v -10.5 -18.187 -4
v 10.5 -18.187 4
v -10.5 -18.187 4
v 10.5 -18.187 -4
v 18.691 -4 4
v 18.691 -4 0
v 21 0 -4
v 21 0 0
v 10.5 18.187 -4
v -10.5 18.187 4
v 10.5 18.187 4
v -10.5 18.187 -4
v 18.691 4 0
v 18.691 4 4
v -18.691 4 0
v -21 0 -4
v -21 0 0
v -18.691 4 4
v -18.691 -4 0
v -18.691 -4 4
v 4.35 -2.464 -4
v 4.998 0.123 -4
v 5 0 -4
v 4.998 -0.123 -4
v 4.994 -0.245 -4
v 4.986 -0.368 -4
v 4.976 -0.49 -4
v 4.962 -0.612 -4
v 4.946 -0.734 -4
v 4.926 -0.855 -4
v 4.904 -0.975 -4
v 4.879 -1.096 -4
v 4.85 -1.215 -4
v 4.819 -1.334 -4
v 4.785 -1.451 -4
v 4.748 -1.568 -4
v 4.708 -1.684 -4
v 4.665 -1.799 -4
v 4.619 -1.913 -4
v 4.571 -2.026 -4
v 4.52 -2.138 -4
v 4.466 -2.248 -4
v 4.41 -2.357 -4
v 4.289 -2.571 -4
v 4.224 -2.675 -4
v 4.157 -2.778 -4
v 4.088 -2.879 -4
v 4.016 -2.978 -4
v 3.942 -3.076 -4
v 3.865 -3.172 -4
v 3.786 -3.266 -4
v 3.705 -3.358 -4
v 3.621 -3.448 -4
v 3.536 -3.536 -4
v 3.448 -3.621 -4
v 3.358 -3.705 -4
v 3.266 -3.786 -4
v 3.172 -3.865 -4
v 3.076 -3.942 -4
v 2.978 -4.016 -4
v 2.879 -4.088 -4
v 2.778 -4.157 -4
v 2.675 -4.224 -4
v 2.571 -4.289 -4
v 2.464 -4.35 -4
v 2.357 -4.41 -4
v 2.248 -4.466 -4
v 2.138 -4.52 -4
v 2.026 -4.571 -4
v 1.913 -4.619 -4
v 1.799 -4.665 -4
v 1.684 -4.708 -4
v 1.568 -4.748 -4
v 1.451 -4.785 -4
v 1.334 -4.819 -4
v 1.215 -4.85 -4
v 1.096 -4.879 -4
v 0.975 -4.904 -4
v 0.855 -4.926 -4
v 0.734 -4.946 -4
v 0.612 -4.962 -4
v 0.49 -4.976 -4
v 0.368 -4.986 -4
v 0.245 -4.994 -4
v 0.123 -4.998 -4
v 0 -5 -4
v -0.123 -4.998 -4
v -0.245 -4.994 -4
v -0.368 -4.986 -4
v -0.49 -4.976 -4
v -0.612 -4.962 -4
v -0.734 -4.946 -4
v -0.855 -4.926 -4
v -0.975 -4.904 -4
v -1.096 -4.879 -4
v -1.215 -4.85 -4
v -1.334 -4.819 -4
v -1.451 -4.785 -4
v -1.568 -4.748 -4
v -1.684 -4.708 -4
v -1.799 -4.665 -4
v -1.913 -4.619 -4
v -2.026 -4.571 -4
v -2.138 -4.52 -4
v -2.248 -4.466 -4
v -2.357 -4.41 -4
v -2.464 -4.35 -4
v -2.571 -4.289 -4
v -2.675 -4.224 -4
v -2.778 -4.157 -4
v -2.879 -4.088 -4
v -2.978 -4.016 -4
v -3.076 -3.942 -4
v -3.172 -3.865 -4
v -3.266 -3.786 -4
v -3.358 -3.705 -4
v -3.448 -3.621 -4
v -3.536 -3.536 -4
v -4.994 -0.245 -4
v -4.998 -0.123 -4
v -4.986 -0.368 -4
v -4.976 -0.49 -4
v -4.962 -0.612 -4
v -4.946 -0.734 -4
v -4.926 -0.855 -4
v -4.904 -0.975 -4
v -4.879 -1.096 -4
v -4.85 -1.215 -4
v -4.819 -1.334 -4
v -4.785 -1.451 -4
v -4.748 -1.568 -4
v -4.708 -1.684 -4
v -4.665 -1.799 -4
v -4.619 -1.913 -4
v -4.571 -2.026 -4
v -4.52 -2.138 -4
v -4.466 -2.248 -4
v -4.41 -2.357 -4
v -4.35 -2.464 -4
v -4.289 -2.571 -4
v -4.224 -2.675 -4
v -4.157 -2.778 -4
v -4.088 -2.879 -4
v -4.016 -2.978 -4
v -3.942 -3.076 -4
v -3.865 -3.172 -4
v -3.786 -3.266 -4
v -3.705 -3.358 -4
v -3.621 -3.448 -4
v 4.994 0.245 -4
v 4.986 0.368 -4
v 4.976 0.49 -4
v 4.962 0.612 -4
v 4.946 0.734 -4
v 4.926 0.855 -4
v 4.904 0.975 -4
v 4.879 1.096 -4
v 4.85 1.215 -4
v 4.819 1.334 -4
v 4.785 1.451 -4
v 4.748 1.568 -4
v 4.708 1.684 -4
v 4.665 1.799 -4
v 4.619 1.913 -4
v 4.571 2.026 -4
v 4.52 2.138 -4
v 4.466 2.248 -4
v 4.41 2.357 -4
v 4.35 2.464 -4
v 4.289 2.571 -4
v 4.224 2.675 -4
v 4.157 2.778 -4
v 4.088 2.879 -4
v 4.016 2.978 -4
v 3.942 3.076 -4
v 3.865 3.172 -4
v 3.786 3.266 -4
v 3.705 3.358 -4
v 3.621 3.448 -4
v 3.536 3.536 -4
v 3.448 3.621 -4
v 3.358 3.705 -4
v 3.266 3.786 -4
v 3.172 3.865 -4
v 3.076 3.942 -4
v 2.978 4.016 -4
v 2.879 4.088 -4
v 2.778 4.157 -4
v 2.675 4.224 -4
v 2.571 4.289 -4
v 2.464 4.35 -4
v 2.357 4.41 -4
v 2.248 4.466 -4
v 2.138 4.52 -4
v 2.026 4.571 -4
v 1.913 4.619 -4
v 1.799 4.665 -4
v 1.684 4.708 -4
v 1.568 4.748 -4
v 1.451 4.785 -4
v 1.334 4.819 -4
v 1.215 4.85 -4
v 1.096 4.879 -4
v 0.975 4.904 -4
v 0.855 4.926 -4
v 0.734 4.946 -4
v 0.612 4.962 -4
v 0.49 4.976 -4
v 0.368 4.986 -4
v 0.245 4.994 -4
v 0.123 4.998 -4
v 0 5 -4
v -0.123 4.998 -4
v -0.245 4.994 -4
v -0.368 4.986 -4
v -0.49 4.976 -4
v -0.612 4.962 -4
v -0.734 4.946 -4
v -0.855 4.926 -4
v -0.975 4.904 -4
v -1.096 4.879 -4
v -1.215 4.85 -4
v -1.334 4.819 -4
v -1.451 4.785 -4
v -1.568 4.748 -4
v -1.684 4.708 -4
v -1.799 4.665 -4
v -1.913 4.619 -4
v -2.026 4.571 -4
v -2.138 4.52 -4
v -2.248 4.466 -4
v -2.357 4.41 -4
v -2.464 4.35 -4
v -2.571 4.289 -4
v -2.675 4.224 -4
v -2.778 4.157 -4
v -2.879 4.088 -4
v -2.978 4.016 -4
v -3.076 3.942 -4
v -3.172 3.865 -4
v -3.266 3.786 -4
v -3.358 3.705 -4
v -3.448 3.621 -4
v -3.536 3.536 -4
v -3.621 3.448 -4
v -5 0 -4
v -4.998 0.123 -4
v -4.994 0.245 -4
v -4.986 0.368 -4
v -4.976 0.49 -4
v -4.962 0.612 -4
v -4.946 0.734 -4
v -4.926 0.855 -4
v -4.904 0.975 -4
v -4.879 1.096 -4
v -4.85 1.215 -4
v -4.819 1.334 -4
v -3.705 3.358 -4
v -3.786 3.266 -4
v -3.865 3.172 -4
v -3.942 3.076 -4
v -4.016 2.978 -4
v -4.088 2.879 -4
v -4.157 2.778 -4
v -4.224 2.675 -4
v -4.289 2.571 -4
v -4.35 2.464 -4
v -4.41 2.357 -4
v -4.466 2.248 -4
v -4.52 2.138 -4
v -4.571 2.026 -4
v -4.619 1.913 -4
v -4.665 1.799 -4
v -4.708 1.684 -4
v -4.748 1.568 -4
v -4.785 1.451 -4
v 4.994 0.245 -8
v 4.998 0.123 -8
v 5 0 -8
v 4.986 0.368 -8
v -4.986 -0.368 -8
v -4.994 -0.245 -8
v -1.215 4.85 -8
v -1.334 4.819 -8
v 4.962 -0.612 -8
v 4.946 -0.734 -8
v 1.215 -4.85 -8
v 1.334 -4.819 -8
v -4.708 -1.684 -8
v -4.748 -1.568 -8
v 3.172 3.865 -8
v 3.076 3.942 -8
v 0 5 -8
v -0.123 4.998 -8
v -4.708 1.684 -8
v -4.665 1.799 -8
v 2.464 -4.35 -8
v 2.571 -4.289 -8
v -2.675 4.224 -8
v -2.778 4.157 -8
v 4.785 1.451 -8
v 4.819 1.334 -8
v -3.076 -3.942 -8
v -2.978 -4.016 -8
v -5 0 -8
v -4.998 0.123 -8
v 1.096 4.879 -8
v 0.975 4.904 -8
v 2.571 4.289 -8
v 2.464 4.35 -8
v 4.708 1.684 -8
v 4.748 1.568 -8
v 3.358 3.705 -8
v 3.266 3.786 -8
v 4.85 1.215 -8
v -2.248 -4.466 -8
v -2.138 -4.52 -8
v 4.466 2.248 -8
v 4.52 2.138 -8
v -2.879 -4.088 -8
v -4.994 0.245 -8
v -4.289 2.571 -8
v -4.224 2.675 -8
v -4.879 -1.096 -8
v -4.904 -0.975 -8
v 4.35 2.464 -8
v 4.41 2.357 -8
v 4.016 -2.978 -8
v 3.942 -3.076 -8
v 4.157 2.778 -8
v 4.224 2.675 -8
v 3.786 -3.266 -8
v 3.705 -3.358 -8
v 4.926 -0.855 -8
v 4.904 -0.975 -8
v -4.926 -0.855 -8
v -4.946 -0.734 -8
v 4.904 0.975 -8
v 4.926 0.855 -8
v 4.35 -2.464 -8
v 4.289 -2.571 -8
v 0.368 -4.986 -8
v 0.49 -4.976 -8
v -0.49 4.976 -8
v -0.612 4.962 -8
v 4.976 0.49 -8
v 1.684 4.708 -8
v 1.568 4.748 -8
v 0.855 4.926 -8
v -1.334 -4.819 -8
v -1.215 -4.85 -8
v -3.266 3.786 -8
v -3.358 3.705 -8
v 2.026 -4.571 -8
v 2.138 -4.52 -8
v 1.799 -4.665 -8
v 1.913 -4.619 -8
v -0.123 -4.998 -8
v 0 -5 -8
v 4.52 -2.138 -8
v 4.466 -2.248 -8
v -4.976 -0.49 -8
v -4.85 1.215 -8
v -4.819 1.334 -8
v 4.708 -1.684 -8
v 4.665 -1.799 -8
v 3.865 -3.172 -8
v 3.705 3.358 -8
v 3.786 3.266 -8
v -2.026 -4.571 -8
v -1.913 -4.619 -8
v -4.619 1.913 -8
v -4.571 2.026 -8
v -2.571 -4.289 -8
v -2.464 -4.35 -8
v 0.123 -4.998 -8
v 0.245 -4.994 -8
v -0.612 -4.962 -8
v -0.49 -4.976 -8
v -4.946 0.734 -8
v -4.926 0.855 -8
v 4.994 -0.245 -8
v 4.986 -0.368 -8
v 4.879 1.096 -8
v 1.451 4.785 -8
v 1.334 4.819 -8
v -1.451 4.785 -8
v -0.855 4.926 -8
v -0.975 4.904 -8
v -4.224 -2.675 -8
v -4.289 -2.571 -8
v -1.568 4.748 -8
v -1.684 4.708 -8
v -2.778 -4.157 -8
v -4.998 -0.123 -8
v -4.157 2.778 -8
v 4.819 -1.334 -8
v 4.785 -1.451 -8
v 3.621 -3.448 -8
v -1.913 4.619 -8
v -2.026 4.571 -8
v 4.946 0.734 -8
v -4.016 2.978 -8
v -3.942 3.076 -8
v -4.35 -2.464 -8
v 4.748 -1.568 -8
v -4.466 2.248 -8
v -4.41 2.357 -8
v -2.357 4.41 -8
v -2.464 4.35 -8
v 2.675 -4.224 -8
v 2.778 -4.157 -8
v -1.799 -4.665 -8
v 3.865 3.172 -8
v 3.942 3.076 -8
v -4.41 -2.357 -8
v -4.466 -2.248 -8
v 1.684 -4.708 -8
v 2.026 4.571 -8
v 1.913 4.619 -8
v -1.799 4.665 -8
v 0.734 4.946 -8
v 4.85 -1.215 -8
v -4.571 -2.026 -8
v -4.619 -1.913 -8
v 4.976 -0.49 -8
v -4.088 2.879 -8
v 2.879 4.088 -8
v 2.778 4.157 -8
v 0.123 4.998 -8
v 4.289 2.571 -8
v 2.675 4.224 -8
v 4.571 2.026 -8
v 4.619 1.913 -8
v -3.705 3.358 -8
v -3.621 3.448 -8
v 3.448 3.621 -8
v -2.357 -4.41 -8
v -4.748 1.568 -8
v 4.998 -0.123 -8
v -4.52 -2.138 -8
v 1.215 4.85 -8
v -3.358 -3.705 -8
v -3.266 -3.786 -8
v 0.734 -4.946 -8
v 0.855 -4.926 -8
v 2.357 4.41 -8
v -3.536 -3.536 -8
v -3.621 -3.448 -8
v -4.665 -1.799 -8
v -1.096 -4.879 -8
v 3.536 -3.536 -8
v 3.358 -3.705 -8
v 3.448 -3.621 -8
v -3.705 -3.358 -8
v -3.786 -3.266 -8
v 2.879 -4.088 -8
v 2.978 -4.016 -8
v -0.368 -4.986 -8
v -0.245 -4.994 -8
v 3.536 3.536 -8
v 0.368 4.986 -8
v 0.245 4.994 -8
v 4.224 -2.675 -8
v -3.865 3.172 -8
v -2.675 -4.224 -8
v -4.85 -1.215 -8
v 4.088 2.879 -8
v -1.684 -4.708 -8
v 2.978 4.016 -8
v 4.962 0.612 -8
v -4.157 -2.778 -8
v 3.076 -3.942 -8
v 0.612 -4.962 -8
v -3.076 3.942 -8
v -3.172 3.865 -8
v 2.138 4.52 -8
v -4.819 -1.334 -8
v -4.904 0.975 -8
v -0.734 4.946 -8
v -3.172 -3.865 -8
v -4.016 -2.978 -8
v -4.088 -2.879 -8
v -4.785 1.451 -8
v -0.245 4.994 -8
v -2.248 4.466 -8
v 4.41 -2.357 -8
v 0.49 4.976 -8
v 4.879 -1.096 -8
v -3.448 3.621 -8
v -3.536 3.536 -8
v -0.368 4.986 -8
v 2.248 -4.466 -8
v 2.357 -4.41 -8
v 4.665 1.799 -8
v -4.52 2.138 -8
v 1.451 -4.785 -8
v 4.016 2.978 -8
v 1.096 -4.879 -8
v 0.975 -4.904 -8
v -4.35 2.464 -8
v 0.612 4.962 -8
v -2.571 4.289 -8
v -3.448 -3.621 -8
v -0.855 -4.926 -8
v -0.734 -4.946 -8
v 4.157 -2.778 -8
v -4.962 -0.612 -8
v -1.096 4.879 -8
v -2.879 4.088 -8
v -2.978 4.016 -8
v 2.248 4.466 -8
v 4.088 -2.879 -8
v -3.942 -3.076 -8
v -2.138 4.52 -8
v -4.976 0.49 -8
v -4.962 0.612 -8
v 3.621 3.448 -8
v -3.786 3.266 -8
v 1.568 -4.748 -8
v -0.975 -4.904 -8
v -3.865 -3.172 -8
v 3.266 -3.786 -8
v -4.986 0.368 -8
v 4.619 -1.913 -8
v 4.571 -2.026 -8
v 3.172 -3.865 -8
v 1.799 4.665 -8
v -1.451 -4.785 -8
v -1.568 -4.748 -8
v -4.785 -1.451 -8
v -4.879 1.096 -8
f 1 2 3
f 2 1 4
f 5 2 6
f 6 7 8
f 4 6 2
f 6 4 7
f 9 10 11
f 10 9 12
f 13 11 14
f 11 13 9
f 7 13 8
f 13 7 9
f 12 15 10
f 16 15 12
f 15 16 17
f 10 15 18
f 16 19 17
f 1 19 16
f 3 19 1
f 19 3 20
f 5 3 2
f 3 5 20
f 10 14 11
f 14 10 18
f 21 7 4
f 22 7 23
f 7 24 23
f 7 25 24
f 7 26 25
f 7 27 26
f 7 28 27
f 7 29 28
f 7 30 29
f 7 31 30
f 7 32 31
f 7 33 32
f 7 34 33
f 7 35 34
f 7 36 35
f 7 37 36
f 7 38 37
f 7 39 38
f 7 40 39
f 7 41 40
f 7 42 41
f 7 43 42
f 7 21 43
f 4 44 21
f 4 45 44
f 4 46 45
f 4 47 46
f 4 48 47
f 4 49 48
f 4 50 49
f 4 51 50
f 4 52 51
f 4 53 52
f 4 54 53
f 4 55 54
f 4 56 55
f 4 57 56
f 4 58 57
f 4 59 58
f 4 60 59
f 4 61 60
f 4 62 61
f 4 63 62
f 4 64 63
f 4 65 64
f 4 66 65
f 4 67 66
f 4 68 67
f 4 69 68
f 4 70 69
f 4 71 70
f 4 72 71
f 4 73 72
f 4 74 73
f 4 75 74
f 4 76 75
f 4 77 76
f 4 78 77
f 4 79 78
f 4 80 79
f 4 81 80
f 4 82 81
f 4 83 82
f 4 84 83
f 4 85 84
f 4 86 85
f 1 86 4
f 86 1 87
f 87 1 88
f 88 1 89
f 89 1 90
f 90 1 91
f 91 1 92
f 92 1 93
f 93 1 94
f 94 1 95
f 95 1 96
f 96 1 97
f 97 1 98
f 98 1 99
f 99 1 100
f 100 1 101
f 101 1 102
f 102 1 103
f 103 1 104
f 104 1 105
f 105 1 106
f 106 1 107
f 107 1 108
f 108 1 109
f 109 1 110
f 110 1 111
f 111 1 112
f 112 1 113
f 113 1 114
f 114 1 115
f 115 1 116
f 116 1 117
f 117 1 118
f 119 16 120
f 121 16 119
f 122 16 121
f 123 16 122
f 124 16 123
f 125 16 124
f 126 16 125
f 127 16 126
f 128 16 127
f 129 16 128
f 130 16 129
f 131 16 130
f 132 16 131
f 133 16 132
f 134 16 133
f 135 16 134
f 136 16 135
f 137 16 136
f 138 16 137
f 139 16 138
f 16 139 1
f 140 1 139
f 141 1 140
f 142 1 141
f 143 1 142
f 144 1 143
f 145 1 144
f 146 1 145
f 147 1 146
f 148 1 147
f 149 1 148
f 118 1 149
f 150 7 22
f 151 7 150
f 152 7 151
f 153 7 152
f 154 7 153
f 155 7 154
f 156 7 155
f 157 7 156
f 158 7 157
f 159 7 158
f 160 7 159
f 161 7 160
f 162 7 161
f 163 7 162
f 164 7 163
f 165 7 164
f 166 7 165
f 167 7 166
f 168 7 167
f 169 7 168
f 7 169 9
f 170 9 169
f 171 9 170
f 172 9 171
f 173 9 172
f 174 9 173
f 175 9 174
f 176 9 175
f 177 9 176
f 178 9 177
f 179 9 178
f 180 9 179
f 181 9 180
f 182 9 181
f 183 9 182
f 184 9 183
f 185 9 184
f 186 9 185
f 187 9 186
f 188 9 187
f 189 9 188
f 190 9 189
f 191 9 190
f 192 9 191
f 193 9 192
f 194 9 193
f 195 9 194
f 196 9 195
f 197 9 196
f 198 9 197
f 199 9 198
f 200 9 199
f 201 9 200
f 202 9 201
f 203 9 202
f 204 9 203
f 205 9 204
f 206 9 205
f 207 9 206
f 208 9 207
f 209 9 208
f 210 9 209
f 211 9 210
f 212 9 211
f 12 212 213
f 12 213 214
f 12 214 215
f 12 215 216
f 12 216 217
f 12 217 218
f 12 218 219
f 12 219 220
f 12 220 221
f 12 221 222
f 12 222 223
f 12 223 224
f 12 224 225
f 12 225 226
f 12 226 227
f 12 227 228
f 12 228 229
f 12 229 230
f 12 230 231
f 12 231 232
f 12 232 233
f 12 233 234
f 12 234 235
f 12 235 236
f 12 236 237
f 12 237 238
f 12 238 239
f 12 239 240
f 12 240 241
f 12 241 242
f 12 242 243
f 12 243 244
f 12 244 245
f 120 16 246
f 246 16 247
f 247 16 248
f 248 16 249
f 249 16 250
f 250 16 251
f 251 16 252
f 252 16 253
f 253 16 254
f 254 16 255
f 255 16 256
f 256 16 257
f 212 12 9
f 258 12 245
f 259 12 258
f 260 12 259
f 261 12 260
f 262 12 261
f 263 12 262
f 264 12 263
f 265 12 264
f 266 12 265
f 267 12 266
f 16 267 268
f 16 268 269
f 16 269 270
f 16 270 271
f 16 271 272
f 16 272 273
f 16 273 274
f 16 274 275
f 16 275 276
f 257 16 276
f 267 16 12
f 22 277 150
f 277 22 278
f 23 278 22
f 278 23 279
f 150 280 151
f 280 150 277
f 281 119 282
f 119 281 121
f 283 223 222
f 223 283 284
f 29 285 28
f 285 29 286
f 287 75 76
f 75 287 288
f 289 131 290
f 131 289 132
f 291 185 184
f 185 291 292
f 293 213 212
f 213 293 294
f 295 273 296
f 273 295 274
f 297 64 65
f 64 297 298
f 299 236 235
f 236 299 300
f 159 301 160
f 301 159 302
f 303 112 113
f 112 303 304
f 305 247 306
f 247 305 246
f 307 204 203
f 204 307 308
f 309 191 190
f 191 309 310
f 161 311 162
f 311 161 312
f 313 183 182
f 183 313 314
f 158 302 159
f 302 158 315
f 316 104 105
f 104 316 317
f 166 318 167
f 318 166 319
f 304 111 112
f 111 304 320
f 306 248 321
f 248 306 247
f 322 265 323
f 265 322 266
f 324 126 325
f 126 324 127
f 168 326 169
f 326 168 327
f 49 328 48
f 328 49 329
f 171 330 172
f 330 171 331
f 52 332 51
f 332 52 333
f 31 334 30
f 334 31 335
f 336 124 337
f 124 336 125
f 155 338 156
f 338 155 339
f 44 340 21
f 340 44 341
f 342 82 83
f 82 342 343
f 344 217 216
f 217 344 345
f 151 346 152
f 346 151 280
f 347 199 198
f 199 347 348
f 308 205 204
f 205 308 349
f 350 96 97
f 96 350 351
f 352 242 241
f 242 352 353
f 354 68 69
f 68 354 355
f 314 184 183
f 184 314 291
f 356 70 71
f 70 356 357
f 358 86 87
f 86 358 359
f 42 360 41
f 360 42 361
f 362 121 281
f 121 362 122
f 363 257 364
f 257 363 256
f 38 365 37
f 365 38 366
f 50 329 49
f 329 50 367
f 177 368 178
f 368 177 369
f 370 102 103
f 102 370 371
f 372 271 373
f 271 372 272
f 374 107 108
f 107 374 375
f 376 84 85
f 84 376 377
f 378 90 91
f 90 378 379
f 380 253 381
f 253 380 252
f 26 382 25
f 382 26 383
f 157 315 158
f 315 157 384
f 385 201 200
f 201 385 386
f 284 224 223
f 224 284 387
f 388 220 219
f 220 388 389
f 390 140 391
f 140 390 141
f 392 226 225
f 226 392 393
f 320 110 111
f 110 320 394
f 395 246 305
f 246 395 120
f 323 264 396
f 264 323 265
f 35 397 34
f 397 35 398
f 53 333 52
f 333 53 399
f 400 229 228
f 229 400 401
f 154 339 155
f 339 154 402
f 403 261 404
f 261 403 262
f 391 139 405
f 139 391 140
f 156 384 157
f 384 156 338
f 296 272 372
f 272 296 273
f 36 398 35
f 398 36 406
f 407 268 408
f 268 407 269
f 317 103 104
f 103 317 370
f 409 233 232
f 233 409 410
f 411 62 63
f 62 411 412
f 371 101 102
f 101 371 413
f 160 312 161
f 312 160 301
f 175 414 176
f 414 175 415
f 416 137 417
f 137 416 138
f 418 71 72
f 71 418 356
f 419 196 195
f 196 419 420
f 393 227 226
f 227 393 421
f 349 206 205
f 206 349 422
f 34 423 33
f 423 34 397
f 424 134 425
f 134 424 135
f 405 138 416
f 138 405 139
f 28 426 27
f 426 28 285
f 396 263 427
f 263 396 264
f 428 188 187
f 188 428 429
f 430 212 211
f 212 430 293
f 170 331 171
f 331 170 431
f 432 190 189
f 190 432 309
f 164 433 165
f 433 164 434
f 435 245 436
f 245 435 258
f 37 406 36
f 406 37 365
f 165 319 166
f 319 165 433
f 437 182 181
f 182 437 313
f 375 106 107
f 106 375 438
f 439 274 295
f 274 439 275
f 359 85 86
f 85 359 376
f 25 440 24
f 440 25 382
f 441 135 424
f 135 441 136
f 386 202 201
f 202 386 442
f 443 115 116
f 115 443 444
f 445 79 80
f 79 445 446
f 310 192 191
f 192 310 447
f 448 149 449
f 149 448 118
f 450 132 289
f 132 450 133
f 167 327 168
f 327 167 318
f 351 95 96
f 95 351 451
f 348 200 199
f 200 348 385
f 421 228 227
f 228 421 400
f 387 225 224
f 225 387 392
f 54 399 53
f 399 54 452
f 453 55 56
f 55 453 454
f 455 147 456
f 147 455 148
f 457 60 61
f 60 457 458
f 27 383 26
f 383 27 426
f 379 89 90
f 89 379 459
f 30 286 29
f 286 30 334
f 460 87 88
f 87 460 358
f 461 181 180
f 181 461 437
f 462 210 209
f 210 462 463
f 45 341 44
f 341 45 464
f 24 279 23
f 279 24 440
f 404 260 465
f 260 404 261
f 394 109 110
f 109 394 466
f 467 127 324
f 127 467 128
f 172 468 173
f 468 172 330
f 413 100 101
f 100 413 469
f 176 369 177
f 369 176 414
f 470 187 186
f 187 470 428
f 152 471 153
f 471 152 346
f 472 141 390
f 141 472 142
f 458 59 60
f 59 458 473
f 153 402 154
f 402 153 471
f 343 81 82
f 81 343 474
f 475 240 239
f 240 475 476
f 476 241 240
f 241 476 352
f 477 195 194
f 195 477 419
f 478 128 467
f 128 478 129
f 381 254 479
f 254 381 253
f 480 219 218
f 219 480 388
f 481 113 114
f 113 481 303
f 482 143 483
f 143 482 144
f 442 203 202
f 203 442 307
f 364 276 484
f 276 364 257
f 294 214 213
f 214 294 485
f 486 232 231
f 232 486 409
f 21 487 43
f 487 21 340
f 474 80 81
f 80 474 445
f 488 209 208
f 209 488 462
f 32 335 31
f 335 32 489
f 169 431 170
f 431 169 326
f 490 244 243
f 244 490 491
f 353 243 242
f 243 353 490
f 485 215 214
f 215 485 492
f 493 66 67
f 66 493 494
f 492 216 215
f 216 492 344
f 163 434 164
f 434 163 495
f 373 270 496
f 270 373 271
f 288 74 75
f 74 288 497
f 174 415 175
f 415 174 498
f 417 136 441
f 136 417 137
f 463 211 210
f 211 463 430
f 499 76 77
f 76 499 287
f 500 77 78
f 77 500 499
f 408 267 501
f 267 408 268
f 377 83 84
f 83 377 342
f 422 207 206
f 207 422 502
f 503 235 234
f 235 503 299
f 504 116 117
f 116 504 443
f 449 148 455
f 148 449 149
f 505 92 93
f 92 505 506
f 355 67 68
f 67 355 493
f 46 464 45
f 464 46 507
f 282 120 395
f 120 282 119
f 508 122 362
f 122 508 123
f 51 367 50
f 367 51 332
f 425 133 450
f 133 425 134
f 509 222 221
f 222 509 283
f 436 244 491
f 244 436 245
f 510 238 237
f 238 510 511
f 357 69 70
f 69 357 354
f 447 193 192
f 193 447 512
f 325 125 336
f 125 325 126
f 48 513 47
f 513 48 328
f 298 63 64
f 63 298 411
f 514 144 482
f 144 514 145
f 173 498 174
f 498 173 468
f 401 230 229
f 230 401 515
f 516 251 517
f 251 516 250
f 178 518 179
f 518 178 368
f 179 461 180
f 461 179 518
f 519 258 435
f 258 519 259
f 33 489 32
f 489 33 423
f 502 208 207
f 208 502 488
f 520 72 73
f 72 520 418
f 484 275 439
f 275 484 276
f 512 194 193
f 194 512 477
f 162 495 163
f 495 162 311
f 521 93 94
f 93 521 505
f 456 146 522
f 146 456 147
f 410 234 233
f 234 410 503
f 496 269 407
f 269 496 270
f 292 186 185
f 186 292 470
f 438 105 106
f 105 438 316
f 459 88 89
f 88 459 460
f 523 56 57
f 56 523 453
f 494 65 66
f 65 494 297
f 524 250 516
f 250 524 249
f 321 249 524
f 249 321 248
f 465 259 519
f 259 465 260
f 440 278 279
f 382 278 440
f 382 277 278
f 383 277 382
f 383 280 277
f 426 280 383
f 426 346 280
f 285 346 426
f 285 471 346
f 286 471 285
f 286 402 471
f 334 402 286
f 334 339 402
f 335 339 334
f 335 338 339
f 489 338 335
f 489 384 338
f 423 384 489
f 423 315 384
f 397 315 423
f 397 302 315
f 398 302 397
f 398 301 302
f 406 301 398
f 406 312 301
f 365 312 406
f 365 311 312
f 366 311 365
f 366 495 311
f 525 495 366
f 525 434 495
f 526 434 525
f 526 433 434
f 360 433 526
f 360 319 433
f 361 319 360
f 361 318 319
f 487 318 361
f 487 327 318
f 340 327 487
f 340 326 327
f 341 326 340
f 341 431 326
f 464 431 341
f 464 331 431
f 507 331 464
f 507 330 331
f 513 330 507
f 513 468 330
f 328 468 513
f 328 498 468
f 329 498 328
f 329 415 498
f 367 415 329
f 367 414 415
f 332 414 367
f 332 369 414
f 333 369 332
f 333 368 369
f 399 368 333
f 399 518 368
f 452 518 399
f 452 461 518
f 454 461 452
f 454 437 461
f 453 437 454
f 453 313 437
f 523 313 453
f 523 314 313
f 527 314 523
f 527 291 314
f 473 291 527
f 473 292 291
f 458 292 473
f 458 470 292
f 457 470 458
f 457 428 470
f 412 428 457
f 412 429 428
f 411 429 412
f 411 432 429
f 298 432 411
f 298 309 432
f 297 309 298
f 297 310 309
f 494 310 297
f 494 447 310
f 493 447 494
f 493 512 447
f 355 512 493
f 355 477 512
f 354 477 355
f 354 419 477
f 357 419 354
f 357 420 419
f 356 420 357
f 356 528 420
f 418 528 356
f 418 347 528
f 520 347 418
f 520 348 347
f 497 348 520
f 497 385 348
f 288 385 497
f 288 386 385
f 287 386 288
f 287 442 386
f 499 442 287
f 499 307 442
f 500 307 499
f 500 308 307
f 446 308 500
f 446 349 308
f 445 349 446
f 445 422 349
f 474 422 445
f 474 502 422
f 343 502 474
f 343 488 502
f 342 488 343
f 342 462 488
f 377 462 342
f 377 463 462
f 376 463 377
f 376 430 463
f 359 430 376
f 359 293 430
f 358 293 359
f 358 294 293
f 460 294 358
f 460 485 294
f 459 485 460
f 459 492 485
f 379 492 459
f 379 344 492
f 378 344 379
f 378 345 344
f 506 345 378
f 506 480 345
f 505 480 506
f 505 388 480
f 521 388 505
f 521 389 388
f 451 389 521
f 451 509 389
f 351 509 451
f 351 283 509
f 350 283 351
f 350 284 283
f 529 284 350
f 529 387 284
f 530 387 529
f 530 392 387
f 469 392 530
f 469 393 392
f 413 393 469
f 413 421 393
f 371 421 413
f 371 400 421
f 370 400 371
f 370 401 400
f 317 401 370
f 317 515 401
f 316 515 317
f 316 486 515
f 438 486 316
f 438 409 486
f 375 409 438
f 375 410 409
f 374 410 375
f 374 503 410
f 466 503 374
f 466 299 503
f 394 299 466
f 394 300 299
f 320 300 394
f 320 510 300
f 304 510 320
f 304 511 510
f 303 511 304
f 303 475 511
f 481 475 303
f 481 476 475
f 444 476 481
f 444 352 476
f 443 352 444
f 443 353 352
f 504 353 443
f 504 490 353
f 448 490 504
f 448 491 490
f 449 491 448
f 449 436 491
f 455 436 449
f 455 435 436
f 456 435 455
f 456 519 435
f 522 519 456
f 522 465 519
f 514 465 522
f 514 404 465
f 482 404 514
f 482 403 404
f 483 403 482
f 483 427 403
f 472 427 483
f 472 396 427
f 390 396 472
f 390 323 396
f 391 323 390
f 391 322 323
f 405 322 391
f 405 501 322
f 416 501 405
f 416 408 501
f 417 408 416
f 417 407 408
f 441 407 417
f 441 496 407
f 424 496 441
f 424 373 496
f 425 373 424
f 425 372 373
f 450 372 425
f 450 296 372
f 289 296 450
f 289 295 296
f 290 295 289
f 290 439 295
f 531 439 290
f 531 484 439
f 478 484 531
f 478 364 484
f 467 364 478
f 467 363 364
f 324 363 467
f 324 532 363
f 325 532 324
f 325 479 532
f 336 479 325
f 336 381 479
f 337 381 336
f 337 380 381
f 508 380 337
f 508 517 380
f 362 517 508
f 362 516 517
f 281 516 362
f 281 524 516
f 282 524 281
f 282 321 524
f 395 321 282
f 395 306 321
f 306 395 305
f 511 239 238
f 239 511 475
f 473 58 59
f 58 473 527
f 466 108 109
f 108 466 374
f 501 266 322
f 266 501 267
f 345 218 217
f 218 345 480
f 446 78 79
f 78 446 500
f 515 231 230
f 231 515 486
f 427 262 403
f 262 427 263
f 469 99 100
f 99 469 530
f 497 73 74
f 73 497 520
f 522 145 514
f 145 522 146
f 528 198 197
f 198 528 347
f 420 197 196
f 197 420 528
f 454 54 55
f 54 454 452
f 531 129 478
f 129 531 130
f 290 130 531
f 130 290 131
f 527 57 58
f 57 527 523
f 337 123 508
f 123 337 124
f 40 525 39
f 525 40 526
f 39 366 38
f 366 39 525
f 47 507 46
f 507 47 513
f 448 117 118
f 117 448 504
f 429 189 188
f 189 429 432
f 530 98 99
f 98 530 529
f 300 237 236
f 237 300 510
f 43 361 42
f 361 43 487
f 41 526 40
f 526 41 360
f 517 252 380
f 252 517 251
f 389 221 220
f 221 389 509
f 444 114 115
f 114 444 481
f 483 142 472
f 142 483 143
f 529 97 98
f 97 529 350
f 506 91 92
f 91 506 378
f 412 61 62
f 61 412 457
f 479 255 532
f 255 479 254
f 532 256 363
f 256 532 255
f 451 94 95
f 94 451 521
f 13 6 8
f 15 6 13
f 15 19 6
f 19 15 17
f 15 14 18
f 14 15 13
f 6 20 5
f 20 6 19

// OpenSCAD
difference() {
	union() {
		cylinder($fn = 6, center = true, h = 8, r = 21);
		translate(v = [0, 0, -6.0000000000]) {
			cylinder($fn = 256, center = true, h = 4, r = 5);
		}
	}
	rotate(a = [0, 0, [0, 0, 40]]) {
		translate(v = [0, 0, 4.0000000000]) {
			cube(center = true, size = [63, 8, 8]);
		}
	}
}
/***********************************************
*********      SolidPython code:      **********
************************************************
 
__author__ = 'Mark Weinreuter'

from solid.utils import *

from config import *

mirror_thickness = 8

c = cylinder(block_r_mm, h=block_base_h_mm, center=True, segments=6)
c1 = cylinder(block_hole_r_mm, h=block_hole_h_mm, center=True, segments=256)

cut = cube([block_r_mm * 3, mirror_thickness, block_base_h_mm], center=True)

rotz = lambda z: rotate([0, 0, z])

cut = rotz([0, 0, 40])(up(block_base_h_mm / 2)(cut))

# holes_rots = (60, 60 + 180, 60 + 90, (60 + 90 + 180))
# holes = []
# for rot in holes_rots:
#    holes.append(
#        up(block_base_h_mm / 2)(rotate([0, 0, rot])(left(connector_dist_mm)(cylinder(connector_r_mm, h=block_base_h_mm, center=True, segments=256)))))


cable_hole = cylinder(cable_r_mm, h=block_base_h_mm * 10, center=True)
base = c + down((block_base_h_mm + block_hole_h_mm) / 2)(c1)
# base -= cable_hole
# for h in holes:
#    base -= h

turret_w = 30
turret_height = 50
turret_th = 10
t = cube([turret_w, turret_w, turret_height], center=True)
t_cutout = cube([turret_w - 2 * turret_th, turret_w, turret_height], center=True)
t -= translate([0, turret_th, -turret_th])(t_cutout)

base -= cut

scad_render_to_file(t, "scad/block_turret.scad")
scad_render_to_file(base, "scad/blocker_base.scad")
 
 
************************************************/
